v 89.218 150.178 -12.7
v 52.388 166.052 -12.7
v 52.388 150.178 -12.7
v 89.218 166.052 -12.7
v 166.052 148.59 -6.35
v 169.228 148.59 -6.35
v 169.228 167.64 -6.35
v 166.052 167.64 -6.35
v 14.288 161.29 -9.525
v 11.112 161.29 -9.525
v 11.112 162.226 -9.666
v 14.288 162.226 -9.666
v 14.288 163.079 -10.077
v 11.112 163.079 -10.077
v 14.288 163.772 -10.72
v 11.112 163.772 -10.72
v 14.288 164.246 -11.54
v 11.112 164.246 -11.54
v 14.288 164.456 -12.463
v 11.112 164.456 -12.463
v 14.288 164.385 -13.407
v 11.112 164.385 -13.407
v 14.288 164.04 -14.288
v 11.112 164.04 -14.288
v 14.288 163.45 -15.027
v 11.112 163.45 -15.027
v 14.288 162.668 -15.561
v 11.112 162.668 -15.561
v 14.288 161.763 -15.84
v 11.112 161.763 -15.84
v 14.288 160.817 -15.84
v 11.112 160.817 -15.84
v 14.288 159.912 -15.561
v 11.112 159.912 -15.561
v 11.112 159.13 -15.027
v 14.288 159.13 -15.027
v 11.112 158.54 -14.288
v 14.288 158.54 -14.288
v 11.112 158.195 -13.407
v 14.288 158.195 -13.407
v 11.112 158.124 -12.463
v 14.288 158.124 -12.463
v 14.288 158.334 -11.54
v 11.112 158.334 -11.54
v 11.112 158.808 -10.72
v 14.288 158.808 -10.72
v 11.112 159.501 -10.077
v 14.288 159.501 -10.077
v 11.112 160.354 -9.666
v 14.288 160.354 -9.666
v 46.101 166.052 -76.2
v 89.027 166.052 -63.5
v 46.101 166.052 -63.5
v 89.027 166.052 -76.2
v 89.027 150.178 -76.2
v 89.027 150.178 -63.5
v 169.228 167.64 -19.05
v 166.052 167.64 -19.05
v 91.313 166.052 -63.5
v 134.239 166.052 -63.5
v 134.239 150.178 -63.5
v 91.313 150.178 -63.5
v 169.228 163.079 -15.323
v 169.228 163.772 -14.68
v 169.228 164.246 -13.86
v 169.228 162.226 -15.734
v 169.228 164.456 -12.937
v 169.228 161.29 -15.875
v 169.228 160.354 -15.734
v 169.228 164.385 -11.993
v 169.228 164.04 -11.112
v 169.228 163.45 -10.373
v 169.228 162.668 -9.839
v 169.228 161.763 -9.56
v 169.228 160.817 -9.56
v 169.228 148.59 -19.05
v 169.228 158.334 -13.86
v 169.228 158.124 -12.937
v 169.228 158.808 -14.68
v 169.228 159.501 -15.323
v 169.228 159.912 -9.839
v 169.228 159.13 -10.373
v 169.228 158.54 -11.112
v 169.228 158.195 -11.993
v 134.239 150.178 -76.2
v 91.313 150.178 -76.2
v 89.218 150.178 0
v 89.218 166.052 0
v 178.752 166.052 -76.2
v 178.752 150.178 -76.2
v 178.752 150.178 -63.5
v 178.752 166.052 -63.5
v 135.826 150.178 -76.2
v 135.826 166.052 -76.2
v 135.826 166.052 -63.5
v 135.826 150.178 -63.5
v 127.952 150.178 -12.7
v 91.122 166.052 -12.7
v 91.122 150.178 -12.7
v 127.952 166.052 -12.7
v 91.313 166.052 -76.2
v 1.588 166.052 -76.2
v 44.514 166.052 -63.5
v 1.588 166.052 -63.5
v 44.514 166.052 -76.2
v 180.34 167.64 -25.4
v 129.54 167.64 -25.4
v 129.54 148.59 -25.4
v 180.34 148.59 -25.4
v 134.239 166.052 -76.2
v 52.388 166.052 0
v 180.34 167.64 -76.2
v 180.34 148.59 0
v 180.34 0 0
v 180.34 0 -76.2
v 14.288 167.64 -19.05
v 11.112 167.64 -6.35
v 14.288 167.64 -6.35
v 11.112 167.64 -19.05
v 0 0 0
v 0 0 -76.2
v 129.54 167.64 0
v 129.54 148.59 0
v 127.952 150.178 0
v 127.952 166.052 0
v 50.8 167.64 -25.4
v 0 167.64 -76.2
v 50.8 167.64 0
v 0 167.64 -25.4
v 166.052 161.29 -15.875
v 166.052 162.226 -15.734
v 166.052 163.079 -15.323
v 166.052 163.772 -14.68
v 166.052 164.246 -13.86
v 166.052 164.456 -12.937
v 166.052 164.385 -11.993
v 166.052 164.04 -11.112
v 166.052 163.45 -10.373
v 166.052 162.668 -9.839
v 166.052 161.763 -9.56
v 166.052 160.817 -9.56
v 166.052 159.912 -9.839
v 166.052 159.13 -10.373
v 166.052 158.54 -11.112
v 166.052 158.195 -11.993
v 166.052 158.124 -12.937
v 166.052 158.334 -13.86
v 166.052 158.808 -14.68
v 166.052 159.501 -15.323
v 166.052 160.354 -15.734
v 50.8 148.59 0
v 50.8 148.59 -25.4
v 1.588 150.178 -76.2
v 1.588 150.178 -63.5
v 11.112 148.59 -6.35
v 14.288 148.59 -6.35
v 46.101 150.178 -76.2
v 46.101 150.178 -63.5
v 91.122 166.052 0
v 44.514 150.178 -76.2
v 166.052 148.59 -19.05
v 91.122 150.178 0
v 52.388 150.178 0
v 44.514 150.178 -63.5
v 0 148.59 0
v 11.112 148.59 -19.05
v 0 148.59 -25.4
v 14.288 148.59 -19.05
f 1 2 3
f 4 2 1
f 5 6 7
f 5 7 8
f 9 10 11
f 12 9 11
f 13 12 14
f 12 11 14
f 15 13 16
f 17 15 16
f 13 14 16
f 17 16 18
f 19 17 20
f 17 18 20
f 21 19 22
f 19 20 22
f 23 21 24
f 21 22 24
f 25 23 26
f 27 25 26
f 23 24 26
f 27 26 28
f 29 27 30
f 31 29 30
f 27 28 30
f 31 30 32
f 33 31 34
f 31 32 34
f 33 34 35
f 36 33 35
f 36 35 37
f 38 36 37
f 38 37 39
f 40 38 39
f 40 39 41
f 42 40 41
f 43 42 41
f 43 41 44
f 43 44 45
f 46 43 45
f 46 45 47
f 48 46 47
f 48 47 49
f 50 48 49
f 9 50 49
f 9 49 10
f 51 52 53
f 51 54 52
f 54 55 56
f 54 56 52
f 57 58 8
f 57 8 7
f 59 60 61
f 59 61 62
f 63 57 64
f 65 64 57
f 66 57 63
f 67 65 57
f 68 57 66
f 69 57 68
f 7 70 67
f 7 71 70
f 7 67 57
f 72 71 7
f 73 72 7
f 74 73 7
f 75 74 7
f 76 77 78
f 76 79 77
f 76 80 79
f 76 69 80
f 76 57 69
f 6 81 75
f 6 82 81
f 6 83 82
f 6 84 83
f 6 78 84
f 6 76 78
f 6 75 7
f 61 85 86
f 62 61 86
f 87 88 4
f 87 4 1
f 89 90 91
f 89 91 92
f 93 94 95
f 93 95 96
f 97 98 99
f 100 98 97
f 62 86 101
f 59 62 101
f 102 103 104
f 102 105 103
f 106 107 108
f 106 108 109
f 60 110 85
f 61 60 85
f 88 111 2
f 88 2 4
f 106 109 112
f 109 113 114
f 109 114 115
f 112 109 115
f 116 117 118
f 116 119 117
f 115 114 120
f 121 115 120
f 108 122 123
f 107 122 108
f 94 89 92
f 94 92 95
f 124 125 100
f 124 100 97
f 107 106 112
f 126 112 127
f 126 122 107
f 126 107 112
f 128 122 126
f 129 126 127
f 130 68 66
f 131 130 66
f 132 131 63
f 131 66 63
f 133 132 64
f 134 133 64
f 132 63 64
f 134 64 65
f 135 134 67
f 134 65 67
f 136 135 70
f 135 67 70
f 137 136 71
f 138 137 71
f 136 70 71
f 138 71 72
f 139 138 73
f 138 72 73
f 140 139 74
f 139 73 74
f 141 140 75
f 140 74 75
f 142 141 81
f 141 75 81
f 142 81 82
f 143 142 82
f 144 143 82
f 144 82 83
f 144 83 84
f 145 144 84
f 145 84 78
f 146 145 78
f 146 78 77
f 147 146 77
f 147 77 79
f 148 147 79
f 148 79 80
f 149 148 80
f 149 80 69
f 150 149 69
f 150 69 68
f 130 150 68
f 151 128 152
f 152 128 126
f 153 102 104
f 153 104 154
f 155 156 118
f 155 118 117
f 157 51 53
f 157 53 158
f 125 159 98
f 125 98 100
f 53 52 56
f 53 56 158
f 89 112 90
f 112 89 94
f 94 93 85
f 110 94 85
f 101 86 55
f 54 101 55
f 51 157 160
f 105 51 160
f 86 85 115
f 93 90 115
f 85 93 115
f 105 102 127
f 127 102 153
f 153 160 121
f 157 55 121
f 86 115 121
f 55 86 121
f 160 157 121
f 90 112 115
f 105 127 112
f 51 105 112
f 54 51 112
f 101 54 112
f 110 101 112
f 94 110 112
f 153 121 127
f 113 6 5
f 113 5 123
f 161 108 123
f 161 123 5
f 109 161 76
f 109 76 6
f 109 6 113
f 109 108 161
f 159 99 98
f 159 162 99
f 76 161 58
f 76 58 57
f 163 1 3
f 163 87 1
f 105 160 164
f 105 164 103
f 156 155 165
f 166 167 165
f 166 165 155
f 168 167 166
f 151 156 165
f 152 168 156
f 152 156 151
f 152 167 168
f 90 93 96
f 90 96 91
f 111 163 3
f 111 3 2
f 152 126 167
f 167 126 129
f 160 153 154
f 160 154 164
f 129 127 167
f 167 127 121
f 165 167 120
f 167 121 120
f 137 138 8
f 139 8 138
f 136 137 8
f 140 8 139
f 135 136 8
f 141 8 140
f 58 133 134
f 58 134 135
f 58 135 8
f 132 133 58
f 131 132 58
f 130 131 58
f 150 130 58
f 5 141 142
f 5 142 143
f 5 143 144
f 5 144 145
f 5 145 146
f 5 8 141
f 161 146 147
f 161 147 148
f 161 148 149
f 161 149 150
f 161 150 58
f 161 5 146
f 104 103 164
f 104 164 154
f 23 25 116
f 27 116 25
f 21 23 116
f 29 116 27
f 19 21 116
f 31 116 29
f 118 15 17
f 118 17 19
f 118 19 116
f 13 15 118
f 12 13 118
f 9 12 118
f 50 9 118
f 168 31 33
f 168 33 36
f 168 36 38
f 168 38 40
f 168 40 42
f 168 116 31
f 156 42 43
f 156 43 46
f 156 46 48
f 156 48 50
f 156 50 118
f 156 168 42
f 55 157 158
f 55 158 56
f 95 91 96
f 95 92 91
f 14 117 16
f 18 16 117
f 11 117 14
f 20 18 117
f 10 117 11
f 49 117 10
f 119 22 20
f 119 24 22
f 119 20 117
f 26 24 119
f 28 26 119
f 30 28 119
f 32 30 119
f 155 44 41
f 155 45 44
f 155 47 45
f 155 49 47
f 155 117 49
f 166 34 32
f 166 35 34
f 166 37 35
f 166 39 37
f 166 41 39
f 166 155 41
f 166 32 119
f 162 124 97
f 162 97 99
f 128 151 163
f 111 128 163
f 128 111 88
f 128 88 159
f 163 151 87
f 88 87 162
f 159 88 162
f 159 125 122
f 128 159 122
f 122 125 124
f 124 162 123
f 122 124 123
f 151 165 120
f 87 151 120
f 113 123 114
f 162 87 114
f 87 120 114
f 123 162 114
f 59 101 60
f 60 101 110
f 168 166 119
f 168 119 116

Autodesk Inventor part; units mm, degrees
ref_plane "YZ Plane" through (0, 0, 0) normal (1, 0, 0) x (0, 1, 0)
ref_plane "XZ Plane" through (0, 0, 0) normal (0, 1, 0) x (-1, 0, 0)
ref_plane "XY Plane" through (0, 0, 0) normal (0, 0, 1) x (1, 0, 0)
sketch "Sketch1" plane through (0, 0, 0) normal (0, 1, 0) x (-1, 0, 0)
  line L0 (0, 0) -> (-180.34, 0)
  line L1 (-180.34, 0) -> (-180.34, -76.2)
  line L2 (-180.34, -76.2) -> (0, -76.2)
  line L3 (0, -76.2) -> (0, 0)
  dimension "d0" = 180.34
  dimension "d1" = 76.2
extrude "Extrusion1" add sketch "Sketch1" along normal blind 167.64
sketch "Sketch2" plane through (0, 167.64, 0) normal (0, 1, 0) x (1, 0, 0)
  line L0 (0, 0) -> (180.34, 0) projected
  line L1 (180.34, 0) -> (180.34, 76.2) projected
  line L2 (180.34, 76.2) -> (0, 76.2) projected
  line L3 (0, 76.2) -> (0, 0) projected
  line L4 (0, 0) -> (50.8, 0)
  line L5 (50.8, 0) -> (50.8, 25.4)
  line L6 (50.8, 25.4) -> (0, 25.4)
  line L7 (0, 25.4) -> (0, 0)
  line L8 (180.34, 0) -> (129.54, 0)
  line L9 (129.54, 0) -> (129.54, 25.4)
  line L10 (129.54, 25.4) -> (180.34, 25.4)
  line L11 (180.34, 25.4) -> (180.34, 0)
  dimension "d4" = 50.8
  dimension "d5" = 25.4
  dimension "d6" = 50.8
  dimension "d7" = 25.4
extrude "Extrusion2" cut sketch "Sketch2" against normal blind 19.05 contours L3 L6 L5 L0 | L9 L10 L1 L0
sketch "Sketch3" plane through (0, 0, 0) normal (0, 0, 1) x (1, 0, 0)
  line L0 (50.8, 167.64) -> (50.8, 148.59) construction
  line L1 (50.8, 148.59) -> (0, 148.59) projected
  line L2 (0, 0) -> (0, 148.59) projected
  line L3 (0, 0) -> (180.34, 0) projected
  line L4 (180.34, 0) -> (180.34, 148.59) projected
  line L5 (180.34, 148.59) -> (129.54, 148.59) projected
  line L6 (129.54, 148.59) -> (129.54, 167.64) construction
  line L7 (50.8, 167.64) -> (129.54, 167.64) construction
  line L8 (50.8, 167.64) -> (129.54, 167.64)
  line L9 (129.54, 167.64) -> (129.54, 148.59)
  line L10 (129.54, 148.59) -> (50.8, 148.59) construction
  line L11 (50.8, 148.59) -> (50.8, 167.64)
  line L12 (52.3875, 150.1775) -> (127.9525, 150.1775) construction
  line L13 (127.9525, 150.1775) -> (127.9525, 166.0525) construction
  line L14 (127.9525, 166.0525) -> (52.3875, 166.0525) construction
  line L15 (52.3875, 166.0525) -> (52.3875, 150.1775) construction
  line L16 (52.3875, 166.0525) -> (89.2175, 166.0525)
  line L17 (89.2175, 166.0525) -> (89.2175, 150.1775)
  line L18 (89.2175, 150.1775) -> (52.3875, 150.1775)
  line L19 (52.3875, 150.1775) -> (52.3875, 166.0525)
  line L20 (127.9525, 150.1775) -> (91.1225, 150.1775)
  line L21 (91.1225, 150.1775) -> (91.1225, 166.0525)
  line L22 (91.1225, 166.0525) -> (127.9525, 166.0525)
  line L23 (127.9525, 166.0525) -> (127.9525, 150.1775)
  dimension "d10" = 1.5875
  dimension "d11" = 36.83
  dimension "d12" = 36.83
extrude "Extrusion3" cut sketch "Sketch3" against normal blind 12.7 contours L16 L17 L18 L19 | L20 L21 L22 L23
sketch "Sketch4" plane through (180.34, 0, -76.2) normal (0, 0, -1) x (-1, 0, 0)
  line L0 (0, 0) -> (180.34, 0) construction
  line L1 (180.34, 0) -> (180.34, 167.64) construction
  line L2 (0, 167.64) -> (180.34, 167.64) construction
  line L3 (0, 0) -> (0, 167.64) construction
  line L4 (0, 167.64) -> (180.34, 167.64) construction
  line L5 (180.34, 167.64) -> (180.34, 148.59) construction
  line L6 (180.34, 148.59) -> (0, 148.59) construction
  line L7 (0, 148.59) -> (0, 167.64) construction
  line L8 (1.5875, 150.1775) -> (178.7525, 150.1775) construction
  line L9 (178.7525, 150.1775) -> (178.7525, 166.0525) construction
  line L10 (178.7525, 166.0525) -> (1.5875, 166.0525) construction
  line L11 (1.5875, 166.0525) -> (1.5875, 150.1775) construction
  line L12 (1.5875, 166.0525) -> (44.5135, 166.0525)
  line L13 (44.5135, 166.0525) -> (44.5135, 150.1775)
  line L14 (44.5135, 150.1775) -> (1.5875, 150.1775)
  line L15 (1.5875, 150.1775) -> (1.5875, 166.0525)
  line L16 (178.7525, 150.1775) -> (135.8265, 150.1775)
  line L17 (135.8265, 150.1775) -> (135.8265, 166.0525)
  line L18 (135.8265, 166.0525) -> (178.7525, 166.0525)
  line L19 (178.7525, 166.0525) -> (178.7525, 150.1775)
  line L20 (46.101, 150.1775) -> (89.027, 150.1775)
  line L21 (89.027, 150.1775) -> (89.027, 166.0525)
  line L22 (89.027, 166.0525) -> (46.101, 166.0525)
  line L23 (46.101, 166.0525) -> (46.101, 150.1775)
  line L24 (134.239, 150.1775) -> (91.313, 150.1775)
  line L25 (91.313, 150.1775) -> (91.313, 166.0525)
  line L26 (91.313, 166.0525) -> (134.239, 166.0525)
  line L27 (134.239, 166.0525) -> (134.239, 150.1775)
  dimension "d15" = 1.5875
  dimension "d16" = 42.926
  dimension "d17" = 42.926
  dimension "d18" = 42.926
  dimension "d19" = 42.926
  dimension "d20" = 1.5875
  dimension "d21" = 1.5875
extrude "Extrusion4" cut sketch "Sketch4" against normal blind 12.7
sketch "Sketch5" plane through (0, 148.59, 0) normal (0, 1, 0) x (1, 0, 0)
  line L0 (50.8, 0) -> (0, 0) projected
  line L1 (50.8, 25.4) -> (50.8, 0) projected
  line L2 (0, 25.4) -> (50.8, 25.4) projected
  line L3 (0, 0) -> (0, 25.4) projected
  line L4 (180.34, 25.4) -> (180.34, 0) projected
  line L5 (129.54, 25.4) -> (180.34, 25.4) projected
  line L6 (129.54, 0) -> (129.54, 25.4) projected
  line L7 (180.34, 0) -> (129.54, 0) projected
  line L8 (0, 0) -> (12.7, 0) construction
  line L9 (12.7, 0) -> (12.7, 12.7) construction
  line L10 (12.7, 12.7) -> (0, 12.7) construction
  line L11 (0, 12.7) -> (0, 0) construction
  line L12 (180.34, 0) -> (167.64, 0) construction
  line L13 (167.64, 0) -> (167.64, 12.7) construction
  line L14 (167.64, 12.7) -> (180.34, 12.7) construction
  line L15 (180.34, 12.7) -> (180.34, 0) construction
  line L16 (11.1125, 19.05) -> (14.2875, 19.05)
  line L17 (14.2875, 19.05) -> (14.2875, 6.35)
  line L18 (14.2875, 6.35) -> (11.1125, 6.35)
  line L19 (11.1125, 6.35) -> (11.1125, 19.05)
  line L20 (11.1125, 19.05) -> (14.2875, 6.35) construction
  line L21 (14.2875, 19.05) -> (11.1125, 6.35) construction
  line L22 (169.2275, 6.35) -> (166.0525, 6.35)
  line L23 (166.0525, 6.35) -> (166.0525, 19.05)
  line L24 (166.0525, 19.05) -> (169.2275, 19.05)
  line L25 (169.2275, 19.05) -> (169.2275, 6.35)
  line L26 (169.2275, 6.35) -> (166.0525, 19.05) construction
  line L27 (166.0525, 6.35) -> (169.2275, 19.05) construction
  dimension "d24" = 12.7
  dimension "d25" = 12.7
  dimension "d26" = 12.7
  dimension "d27" = 12.7
  dimension "d28" = 3.175
  dimension "d29" = 12.7
  dimension "d30" = 3.175
  dimension "d31" = 12.7
extrude "Extrusion5" add sketch "Sketch5" along normal blind 19.05 contours L16 L17 L18 L19 | L22 L23 L24 L25
sketch "Sketch6" plane through (169.2275, 148.59, -6.35) normal (1, 0, 0) x (0, 0, -1)
  line L0 (12.7, 0) -> (0, 0) construction
  line L1 (12.7, 0) -> (12.7, 19.05) construction
  line L2 (0, 19.05) -> (12.7, 19.05) construction
  line L3 (0, 0) -> (0, 19.05) construction
  line L4 (0, 19.05) -> (6.35, 19.05) construction
  line L5 (6.35, 19.05) -> (6.35, 12.7) construction
  line L6 (6.35, 12.7) -> (0, 12.7) construction
  line L7 (0, 12.7) -> (0, 19.05) construction
  circle A0 centre (6.35, 12.7) radius 3.175
  point P0 (-6.35, -148.59)
  dimension "d34" = 6.35
  dimension "d35" = 6.35
  dimension "d36" = 6.35
extrude "Extrusion6" cut sketch "Sketch6" against normal blind 25.4
sketch "Sketch7" plane through (11.1125, 148.59, -19.05) normal (-1, 0, 0) x (0, 0, 1)
  line L0 (12.7, 0) -> (0, 0) construction
  line L1 (12.7, 0) -> (12.7, 19.05) construction
  line L2 (0, 19.05) -> (12.7, 19.05) construction
  line L3 (0, 0) -> (0, 19.05) construction
  line L4 (12.7, 19.05) -> (6.35, 19.05) construction
  line L5 (6.35, 19.05) -> (6.35, 12.7) construction
  line L6 (6.35, 12.7) -> (12.7, 12.7) construction
  line L7 (12.7, 12.7) -> (12.7, 19.05) construction
  circle A0 centre (6.35, 12.7) radius 3.175
  point P0 (19.05, -148.59)
  dimension "d39" = 6.35
  dimension "d40" = 6.35
  dimension "d41" = 6.35
extrude "Extrusion7" cut sketch "Sketch7" against normal blind 25.4
properties part number "battery"
